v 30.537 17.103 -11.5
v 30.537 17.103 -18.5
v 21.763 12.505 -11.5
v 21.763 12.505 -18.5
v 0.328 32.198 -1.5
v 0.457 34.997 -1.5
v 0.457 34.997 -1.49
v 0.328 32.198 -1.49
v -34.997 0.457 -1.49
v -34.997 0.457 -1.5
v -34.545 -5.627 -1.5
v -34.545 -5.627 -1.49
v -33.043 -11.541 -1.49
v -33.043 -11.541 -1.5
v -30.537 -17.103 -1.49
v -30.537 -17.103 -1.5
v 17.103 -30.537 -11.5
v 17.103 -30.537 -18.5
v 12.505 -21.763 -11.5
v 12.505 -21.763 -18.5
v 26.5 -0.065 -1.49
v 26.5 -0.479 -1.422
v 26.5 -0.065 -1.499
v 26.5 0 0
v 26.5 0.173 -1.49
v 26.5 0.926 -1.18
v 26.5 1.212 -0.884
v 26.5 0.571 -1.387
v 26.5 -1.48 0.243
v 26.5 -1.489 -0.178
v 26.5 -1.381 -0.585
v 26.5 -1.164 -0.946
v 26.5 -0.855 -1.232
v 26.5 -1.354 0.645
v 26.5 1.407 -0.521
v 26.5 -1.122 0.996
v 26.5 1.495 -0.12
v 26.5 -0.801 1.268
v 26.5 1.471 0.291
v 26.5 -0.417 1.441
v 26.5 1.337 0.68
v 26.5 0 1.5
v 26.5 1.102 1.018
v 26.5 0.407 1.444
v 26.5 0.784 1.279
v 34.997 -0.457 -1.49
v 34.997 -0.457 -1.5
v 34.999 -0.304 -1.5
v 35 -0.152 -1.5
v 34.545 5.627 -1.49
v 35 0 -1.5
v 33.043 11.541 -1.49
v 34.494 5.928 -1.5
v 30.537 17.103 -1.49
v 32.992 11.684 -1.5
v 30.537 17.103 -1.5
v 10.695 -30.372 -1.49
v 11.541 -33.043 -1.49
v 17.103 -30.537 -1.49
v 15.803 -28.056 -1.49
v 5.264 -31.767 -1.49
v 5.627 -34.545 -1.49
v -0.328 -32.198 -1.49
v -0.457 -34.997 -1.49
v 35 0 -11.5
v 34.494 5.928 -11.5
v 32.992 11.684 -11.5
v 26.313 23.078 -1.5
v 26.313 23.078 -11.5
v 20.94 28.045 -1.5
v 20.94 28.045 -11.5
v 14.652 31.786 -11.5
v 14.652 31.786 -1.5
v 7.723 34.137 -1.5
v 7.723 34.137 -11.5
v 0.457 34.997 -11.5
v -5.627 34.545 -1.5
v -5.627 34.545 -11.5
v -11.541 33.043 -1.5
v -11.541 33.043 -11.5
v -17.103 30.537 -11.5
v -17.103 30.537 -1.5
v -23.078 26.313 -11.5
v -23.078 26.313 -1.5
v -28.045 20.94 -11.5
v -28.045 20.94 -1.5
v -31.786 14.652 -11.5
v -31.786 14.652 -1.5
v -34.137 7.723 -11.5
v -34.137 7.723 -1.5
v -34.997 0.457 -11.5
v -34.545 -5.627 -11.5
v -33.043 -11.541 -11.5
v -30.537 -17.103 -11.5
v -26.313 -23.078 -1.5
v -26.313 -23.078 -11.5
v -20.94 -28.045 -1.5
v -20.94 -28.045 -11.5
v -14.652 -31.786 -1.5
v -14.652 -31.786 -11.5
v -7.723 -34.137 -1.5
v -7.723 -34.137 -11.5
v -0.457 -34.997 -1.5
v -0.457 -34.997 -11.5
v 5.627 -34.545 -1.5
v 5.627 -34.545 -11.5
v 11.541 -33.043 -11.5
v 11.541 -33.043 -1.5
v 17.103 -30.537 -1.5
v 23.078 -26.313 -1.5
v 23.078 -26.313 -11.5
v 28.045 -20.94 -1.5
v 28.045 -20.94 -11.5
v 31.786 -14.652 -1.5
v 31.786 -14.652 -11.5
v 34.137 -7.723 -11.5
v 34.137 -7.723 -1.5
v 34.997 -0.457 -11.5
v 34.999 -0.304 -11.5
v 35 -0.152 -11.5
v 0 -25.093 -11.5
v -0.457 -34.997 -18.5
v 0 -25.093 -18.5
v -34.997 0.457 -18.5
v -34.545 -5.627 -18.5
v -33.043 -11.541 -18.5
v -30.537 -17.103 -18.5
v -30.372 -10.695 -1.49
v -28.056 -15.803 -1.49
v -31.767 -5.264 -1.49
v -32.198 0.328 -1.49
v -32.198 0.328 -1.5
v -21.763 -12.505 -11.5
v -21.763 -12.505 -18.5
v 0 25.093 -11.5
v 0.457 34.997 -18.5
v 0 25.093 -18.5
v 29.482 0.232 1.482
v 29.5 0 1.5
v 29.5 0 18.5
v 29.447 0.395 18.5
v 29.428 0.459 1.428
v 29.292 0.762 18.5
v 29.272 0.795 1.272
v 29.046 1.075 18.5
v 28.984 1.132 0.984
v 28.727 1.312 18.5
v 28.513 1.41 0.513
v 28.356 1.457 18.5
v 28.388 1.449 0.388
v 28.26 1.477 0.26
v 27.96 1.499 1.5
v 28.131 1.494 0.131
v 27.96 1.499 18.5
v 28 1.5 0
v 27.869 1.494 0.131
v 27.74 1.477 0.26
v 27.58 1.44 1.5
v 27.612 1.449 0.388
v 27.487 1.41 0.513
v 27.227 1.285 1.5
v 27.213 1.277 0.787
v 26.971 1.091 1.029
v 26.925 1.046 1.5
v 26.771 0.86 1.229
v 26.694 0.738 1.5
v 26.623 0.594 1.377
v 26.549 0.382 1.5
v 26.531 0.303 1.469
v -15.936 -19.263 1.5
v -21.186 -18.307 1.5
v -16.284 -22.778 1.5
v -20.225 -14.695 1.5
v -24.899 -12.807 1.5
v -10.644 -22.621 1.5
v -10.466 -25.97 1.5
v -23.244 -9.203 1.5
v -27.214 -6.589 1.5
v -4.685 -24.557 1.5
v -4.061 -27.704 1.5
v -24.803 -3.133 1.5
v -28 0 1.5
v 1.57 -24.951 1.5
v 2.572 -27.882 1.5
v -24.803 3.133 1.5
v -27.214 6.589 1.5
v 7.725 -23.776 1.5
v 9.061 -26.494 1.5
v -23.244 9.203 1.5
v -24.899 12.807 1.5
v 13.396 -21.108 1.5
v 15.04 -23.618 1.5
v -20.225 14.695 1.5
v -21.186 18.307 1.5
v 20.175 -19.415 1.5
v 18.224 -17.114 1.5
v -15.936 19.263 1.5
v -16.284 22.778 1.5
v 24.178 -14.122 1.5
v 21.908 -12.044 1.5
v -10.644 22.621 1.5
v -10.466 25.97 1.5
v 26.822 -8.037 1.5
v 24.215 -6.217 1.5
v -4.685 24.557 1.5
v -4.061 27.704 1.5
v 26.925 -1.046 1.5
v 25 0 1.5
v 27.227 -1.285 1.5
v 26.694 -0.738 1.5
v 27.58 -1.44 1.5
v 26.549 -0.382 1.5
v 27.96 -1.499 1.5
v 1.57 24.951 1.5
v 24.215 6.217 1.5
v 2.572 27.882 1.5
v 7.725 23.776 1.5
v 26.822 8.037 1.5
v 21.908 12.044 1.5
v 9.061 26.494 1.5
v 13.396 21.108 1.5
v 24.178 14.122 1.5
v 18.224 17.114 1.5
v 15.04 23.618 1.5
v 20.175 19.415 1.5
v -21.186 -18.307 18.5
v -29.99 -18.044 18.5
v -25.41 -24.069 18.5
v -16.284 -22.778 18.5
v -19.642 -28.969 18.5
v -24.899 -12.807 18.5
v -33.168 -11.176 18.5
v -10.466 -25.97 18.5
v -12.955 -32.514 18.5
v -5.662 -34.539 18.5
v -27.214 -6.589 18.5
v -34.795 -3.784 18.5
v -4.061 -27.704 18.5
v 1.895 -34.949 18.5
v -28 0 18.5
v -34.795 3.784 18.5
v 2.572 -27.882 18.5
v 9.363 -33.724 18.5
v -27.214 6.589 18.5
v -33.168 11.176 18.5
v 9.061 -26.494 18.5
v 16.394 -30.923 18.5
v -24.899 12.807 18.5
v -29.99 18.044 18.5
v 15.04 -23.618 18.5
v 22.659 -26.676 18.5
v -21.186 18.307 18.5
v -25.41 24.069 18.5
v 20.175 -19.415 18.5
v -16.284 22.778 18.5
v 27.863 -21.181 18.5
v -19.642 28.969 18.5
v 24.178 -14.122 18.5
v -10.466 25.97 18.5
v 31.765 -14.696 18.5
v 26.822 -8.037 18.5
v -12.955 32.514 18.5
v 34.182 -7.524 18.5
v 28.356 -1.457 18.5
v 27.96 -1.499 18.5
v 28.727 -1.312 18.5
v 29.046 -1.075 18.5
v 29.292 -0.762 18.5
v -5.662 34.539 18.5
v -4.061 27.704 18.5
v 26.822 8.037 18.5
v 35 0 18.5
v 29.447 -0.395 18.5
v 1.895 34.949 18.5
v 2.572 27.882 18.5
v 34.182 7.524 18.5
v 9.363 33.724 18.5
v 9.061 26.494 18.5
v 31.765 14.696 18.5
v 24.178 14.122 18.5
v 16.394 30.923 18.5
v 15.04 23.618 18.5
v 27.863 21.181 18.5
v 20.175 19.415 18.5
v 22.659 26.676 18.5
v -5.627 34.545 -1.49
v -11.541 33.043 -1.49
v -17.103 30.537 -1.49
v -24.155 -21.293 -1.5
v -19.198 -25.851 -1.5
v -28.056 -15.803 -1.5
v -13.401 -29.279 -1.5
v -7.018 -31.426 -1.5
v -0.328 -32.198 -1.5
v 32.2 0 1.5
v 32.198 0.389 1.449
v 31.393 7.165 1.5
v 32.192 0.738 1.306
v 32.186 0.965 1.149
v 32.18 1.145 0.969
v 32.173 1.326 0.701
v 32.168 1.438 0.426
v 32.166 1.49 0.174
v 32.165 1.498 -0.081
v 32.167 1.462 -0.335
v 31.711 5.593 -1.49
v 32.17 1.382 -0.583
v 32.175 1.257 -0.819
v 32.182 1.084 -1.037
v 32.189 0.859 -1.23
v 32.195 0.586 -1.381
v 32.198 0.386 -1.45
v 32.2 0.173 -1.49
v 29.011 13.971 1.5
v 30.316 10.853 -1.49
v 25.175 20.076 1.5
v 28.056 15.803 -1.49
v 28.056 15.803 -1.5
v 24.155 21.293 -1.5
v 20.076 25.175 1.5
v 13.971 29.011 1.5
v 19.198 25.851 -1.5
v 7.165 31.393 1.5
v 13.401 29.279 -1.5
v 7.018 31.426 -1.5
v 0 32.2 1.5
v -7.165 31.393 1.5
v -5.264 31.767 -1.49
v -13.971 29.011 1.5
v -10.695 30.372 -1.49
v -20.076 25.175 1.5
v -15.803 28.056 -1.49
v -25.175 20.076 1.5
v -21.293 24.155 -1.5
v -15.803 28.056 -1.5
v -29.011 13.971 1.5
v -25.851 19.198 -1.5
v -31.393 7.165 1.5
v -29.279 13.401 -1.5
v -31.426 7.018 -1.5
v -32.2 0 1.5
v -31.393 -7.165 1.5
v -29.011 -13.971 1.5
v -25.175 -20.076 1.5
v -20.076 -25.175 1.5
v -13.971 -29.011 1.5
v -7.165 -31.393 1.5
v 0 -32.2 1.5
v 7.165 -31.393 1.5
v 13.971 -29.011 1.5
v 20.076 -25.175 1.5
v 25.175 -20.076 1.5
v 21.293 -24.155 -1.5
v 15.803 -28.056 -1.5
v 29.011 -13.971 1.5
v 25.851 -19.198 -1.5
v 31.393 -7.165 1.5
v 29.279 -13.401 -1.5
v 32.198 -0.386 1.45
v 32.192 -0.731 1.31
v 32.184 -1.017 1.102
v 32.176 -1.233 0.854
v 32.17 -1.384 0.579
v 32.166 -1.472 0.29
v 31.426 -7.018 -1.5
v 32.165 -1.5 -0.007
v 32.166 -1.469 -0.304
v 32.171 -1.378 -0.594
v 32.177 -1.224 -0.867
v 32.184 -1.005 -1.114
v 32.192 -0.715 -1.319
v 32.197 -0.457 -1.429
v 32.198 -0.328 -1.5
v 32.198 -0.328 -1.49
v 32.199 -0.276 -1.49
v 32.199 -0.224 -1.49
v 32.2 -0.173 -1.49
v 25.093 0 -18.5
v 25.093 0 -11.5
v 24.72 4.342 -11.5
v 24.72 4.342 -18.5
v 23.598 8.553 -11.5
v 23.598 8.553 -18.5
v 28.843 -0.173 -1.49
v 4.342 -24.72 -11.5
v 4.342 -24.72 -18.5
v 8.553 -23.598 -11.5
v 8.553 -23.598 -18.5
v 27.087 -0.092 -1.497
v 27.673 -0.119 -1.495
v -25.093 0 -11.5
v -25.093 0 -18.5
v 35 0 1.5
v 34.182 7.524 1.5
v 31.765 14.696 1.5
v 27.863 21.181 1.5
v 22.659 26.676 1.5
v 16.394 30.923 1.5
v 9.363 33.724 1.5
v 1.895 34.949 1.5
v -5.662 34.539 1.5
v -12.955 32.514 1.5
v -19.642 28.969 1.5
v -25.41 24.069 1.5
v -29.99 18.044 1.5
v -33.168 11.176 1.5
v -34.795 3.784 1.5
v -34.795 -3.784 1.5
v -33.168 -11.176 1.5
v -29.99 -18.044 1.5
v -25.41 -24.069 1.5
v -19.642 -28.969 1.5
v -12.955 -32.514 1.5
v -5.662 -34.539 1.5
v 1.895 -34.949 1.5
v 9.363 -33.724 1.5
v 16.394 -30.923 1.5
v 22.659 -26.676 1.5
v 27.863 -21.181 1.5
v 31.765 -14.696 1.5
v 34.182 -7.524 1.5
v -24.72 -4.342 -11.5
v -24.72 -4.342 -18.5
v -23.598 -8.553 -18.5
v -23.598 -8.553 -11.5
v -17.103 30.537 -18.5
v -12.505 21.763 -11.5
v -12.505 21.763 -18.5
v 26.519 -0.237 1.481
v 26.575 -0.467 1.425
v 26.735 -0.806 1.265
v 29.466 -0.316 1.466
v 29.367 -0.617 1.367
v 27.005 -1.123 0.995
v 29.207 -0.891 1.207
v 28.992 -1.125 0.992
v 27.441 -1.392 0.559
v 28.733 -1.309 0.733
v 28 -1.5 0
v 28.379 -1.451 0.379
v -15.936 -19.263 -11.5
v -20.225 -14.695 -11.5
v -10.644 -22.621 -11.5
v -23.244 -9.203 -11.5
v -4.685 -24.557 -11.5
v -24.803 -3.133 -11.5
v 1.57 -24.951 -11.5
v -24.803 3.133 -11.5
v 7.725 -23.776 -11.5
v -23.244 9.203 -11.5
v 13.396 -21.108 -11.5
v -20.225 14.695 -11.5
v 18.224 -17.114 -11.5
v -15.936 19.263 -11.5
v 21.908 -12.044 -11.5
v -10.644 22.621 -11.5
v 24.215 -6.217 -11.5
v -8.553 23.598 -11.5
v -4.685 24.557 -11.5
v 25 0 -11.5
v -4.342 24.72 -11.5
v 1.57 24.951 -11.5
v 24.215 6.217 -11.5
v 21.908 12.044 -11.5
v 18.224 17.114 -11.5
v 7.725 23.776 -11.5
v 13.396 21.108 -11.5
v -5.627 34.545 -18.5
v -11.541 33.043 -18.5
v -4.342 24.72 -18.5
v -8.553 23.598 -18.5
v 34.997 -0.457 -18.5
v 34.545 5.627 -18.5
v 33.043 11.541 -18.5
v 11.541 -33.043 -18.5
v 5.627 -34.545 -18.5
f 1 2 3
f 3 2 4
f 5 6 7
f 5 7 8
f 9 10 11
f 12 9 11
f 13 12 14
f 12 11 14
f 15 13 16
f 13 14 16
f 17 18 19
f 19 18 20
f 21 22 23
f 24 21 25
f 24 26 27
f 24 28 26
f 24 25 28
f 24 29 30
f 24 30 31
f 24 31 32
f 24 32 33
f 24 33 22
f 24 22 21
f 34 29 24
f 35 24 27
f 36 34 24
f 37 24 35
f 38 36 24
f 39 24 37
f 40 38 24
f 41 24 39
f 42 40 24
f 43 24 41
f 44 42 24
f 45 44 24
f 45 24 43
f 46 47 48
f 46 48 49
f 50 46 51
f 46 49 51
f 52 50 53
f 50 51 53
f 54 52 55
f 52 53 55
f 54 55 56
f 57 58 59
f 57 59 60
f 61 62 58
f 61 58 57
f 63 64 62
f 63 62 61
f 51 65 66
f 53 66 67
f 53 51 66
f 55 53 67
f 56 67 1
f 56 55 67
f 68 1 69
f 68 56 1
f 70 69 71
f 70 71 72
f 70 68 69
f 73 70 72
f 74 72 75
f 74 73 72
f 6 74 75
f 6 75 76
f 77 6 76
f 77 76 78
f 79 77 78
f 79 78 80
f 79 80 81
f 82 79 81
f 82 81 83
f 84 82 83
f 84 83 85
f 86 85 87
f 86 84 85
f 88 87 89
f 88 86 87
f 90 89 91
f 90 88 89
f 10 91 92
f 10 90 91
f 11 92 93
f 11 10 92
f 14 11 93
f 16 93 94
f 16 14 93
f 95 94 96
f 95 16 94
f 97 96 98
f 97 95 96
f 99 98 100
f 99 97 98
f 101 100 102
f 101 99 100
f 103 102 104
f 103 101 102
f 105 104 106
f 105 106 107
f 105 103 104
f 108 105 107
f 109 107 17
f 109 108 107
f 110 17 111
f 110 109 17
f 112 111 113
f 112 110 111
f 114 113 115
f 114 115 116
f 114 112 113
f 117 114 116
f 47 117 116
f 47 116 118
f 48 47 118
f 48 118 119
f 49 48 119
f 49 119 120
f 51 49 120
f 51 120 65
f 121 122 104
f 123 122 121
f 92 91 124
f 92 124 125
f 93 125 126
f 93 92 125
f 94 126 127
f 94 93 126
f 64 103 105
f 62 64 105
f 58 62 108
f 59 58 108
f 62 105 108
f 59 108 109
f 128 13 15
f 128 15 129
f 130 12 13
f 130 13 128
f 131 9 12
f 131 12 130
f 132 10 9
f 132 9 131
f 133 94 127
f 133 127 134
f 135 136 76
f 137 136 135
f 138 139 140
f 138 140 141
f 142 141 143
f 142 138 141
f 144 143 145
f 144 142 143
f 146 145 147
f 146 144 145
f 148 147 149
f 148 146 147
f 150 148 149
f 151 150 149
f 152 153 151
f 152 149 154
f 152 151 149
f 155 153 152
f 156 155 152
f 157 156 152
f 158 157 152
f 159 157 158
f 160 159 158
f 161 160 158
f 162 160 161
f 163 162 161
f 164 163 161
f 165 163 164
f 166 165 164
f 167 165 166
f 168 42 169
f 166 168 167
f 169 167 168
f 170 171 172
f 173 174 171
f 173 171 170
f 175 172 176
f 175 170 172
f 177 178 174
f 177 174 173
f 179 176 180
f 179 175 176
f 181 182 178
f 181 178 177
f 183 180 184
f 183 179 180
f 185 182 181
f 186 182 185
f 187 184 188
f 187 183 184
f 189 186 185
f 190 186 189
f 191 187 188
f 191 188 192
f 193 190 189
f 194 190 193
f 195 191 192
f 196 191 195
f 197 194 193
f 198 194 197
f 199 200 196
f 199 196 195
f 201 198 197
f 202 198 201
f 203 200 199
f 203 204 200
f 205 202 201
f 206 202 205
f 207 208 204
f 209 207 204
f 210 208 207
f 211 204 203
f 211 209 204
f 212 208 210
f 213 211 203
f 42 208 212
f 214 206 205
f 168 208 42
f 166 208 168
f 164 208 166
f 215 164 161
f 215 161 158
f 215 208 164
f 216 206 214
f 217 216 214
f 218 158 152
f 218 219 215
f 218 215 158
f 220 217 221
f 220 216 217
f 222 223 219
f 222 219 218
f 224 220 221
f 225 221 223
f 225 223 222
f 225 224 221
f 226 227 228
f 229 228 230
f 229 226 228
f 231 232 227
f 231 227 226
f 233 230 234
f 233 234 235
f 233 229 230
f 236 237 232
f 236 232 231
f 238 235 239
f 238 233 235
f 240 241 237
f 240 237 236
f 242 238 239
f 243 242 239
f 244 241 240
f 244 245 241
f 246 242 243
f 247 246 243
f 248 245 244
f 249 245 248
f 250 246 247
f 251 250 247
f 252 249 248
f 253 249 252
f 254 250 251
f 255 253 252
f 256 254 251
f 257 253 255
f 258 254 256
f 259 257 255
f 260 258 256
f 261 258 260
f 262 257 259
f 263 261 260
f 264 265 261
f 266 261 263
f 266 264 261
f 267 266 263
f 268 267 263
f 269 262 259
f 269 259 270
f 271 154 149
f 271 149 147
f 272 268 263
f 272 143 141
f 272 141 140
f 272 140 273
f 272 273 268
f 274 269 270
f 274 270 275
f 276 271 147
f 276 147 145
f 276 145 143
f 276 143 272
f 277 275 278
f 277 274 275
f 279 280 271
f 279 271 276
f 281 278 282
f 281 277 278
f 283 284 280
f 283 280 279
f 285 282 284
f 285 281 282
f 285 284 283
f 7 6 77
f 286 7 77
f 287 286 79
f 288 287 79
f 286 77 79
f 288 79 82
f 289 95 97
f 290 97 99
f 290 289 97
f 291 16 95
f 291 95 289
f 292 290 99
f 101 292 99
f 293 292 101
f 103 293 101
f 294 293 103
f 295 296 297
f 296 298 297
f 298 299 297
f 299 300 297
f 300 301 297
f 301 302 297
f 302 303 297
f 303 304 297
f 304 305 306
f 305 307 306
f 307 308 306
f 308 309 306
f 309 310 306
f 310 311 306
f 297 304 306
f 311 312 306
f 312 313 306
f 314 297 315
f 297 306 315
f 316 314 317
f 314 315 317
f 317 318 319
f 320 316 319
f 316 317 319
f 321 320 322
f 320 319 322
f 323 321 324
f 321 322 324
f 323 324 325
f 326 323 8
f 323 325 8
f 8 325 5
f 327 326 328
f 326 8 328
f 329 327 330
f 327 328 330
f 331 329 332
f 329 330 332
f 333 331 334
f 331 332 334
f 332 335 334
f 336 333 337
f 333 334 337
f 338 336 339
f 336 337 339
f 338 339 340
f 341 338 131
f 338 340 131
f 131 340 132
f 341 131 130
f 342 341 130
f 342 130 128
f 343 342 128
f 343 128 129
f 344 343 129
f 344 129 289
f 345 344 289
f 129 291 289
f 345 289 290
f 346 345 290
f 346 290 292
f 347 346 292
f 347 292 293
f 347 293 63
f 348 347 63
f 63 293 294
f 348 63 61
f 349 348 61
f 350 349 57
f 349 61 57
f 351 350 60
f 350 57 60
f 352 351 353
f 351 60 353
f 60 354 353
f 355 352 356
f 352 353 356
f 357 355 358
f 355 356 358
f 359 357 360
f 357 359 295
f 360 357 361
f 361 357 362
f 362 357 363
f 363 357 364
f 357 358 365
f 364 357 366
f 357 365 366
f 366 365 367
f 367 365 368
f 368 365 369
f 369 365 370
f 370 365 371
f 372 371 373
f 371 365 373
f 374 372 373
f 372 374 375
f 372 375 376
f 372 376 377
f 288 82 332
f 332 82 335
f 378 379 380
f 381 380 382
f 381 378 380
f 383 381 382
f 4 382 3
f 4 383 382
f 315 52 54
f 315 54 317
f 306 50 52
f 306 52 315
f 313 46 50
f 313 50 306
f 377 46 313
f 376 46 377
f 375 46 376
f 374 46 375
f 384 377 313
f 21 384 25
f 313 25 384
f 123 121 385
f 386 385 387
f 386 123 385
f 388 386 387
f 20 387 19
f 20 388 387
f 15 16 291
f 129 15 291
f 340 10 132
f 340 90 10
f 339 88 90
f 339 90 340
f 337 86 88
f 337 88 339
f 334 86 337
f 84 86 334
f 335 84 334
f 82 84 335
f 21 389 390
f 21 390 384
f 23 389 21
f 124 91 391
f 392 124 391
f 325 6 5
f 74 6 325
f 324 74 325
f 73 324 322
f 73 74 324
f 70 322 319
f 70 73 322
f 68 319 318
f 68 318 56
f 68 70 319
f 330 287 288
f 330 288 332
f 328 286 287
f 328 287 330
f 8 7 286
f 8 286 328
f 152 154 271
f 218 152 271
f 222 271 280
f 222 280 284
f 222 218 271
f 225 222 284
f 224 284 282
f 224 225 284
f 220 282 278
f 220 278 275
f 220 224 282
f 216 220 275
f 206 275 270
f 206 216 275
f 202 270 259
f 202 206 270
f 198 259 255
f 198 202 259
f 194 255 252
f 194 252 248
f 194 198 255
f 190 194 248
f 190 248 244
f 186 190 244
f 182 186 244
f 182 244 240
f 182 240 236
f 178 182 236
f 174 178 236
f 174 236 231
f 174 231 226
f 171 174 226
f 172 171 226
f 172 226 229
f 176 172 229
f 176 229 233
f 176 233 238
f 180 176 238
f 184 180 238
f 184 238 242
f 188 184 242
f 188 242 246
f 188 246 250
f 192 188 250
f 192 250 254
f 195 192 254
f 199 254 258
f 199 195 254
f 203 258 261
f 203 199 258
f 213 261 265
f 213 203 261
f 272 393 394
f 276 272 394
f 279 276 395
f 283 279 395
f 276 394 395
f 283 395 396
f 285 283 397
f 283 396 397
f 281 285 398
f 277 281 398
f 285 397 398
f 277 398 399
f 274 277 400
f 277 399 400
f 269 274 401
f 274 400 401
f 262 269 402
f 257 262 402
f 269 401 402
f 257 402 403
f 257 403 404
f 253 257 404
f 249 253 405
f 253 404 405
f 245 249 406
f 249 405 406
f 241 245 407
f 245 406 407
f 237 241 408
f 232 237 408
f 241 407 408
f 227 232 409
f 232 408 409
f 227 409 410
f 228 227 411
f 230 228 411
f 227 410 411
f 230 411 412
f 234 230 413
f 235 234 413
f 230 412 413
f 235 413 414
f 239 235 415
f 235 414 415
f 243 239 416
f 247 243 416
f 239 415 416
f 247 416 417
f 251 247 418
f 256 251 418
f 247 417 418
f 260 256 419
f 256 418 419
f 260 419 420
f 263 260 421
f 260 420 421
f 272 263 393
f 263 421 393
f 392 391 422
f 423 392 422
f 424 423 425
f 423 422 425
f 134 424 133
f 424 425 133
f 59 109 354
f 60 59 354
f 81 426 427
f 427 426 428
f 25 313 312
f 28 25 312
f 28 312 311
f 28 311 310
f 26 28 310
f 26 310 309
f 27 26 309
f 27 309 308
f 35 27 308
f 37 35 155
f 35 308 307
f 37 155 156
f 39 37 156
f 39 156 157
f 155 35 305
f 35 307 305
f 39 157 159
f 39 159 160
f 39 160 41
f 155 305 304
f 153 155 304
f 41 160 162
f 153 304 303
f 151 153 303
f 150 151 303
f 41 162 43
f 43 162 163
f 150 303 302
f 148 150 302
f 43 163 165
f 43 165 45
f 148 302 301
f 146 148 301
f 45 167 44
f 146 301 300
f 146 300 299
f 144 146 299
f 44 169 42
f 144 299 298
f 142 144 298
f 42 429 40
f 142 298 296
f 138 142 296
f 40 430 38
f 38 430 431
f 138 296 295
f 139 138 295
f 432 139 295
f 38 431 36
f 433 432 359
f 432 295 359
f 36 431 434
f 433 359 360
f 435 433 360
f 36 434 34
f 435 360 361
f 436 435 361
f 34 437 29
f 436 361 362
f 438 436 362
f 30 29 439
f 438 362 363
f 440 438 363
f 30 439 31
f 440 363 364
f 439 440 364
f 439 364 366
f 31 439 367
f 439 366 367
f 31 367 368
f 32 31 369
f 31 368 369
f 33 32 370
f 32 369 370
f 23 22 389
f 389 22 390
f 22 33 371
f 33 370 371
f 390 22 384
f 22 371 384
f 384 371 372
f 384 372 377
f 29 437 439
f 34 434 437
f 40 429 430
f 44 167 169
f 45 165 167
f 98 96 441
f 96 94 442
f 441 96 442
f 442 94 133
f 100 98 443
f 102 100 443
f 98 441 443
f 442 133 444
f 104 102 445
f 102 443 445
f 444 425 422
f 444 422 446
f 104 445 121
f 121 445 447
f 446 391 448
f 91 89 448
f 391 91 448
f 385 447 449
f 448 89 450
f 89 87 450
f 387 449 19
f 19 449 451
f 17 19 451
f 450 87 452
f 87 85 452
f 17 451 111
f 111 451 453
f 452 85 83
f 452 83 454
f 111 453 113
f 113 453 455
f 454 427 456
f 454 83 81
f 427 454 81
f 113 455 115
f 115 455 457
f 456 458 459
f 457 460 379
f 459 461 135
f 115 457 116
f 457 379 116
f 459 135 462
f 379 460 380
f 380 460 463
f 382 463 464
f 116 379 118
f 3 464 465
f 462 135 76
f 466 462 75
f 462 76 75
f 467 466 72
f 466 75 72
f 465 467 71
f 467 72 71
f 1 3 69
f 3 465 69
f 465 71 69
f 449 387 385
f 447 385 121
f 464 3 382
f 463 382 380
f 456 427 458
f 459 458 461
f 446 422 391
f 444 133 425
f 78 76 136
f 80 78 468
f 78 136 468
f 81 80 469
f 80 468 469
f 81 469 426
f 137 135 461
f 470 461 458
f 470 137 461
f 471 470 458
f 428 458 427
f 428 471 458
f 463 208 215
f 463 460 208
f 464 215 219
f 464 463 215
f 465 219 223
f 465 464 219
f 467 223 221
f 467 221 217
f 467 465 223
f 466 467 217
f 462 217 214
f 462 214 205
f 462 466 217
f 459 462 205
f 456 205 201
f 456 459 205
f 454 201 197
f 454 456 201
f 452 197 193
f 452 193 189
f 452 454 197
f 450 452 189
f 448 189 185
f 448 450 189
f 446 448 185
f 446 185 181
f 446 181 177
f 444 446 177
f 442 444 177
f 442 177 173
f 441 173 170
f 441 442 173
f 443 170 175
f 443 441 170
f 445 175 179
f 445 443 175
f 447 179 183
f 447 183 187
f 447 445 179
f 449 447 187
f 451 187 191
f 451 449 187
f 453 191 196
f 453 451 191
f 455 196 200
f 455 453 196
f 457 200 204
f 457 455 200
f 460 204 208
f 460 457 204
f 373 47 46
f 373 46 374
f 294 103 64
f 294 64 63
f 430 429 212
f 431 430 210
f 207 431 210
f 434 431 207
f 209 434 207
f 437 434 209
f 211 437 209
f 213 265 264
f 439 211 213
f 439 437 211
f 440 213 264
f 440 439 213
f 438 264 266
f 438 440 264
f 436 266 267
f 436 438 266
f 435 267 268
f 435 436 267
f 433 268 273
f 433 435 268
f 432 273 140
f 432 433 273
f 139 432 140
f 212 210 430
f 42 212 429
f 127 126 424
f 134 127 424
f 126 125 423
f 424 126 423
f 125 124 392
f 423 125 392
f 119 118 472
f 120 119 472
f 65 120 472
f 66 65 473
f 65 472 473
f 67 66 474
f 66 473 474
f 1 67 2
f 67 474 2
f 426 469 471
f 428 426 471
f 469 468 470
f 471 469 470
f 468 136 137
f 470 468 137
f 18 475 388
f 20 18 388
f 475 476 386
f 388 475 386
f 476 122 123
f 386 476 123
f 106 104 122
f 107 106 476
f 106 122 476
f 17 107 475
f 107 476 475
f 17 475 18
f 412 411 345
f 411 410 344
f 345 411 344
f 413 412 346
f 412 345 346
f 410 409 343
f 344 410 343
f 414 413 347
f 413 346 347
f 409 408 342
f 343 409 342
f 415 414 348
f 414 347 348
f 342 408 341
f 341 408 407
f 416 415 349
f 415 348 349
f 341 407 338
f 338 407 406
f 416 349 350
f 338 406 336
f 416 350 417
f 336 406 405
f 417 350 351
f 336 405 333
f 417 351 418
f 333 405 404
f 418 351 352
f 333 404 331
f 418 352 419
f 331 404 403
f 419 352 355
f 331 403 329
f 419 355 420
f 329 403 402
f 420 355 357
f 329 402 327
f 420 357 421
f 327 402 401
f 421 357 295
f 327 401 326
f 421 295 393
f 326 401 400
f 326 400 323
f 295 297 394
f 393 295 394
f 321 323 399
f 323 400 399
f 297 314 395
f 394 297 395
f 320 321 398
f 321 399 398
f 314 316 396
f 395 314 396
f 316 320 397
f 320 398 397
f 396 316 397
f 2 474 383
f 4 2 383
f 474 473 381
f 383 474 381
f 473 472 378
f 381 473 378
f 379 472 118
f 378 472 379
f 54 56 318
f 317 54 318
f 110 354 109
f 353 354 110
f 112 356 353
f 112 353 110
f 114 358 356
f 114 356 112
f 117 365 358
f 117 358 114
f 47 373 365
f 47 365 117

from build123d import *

# Parameters (mm, degrees)
SKETCH005_R          = 35
SKETCH005_R_2        = 25
PAD_DEPTH            = 10
SKETCH006_R          = 32.2
SKETCH006_R_2        = 25
PAD001_DEPTH         = 3
SKETCH_R             = 35
SKETCH_R_2           = 28
PAD002_DEPTH         = 17
SKETCH004_R          = 1.5
POCKET_DEPTH         = 20
SKETCH003_R          = 1.5
POCKET001_DEPTH      = 8.5
POCKET001_DEPTH_BACK = 100
PAD003_DEPTH         = 0.01
PAD003_DEPTH_BACK    = 17
POLARPATTERN_COUNT   = 4


with BuildPart() as part:
    # Sketch005 → Pad (new body)
    with BuildSketch(Plane.XY.offset(-1.5)):
        Circle(SKETCH005_R)
        Circle(SKETCH005_R_2, mode=Mode.SUBTRACT)
    extrude(amount=-PAD_DEPTH)

    # Sketch006 → Pad001 (join)
    with BuildSketch(Plane.XY.offset(-1.5)):
        Circle(SKETCH006_R)
        Circle(SKETCH006_R_2, mode=Mode.SUBTRACT)
    extrude(amount=PAD001_DEPTH)

    # Sketch → Pad002 (join)
    with BuildSketch(Plane.XY.offset(1.5)):
        Circle(SKETCH_R)
        Circle(SKETCH_R_2, mode=Mode.SUBTRACT)
    extrude(amount=PAD002_DEPTH)

    # Sketch004 → Pocket (cut)
    with BuildSketch(Plane(origin=(28, 0, 0), x_dir=(1, 0, 0), z_dir=(0, 0, 1))):
        Circle(SKETCH004_R)
    extrude(amount=POCKET_DEPTH, mode=Mode.SUBTRACT)

    # Sketch003 → Pocket001 (cut, two sides)
    with BuildSketch(Plane(origin=(35, 0, 0), x_dir=(0, 0.939693, 0.34202), z_dir=(1, 0, 0))) as pocket001_sk:
        Circle(SKETCH003_R)
    extrude(amount=-POCKET001_DEPTH, mode=Mode.SUBTRACT)
    extrude(pocket001_sk.sketch, amount=POCKET001_DEPTH_BACK, mode=Mode.SUBTRACT)

    # Sketch002 → Pad003 (join, two sides)
    with BuildSketch(Plane.XY.offset(-1.5)) as pad003_sk:
        with BuildLine():
            ThreePointArc((-34.997021, 0.456663), (-33.922719, -8.616793), (-30.53664, -17.103029))
            Line((-30.53664, -17.103029), (-21.762611, -12.504957))
            ThreePointArc((-25.093421, 0), (-24.251171, -6.471733), (-21.762611, -12.504957))
            Line((-34.997021, 0.456663), (-25.093421, 0))
        make_face()
    pad003 = extrude(amount=PAD003_DEPTH) + extrude(pad003_sk.sketch, amount=-PAD003_DEPTH_BACK)

    # PolarPattern: Pad003 ×4 about axis
    polarpattern_axis = Axis((0, 0, -1.5), (0, 0, 1))
    for i in range(1, POLARPATTERN_COUNT):
        add(pad003.rotate(polarpattern_axis, i * 360 / POLARPATTERN_COUNT))


solid = part.part
